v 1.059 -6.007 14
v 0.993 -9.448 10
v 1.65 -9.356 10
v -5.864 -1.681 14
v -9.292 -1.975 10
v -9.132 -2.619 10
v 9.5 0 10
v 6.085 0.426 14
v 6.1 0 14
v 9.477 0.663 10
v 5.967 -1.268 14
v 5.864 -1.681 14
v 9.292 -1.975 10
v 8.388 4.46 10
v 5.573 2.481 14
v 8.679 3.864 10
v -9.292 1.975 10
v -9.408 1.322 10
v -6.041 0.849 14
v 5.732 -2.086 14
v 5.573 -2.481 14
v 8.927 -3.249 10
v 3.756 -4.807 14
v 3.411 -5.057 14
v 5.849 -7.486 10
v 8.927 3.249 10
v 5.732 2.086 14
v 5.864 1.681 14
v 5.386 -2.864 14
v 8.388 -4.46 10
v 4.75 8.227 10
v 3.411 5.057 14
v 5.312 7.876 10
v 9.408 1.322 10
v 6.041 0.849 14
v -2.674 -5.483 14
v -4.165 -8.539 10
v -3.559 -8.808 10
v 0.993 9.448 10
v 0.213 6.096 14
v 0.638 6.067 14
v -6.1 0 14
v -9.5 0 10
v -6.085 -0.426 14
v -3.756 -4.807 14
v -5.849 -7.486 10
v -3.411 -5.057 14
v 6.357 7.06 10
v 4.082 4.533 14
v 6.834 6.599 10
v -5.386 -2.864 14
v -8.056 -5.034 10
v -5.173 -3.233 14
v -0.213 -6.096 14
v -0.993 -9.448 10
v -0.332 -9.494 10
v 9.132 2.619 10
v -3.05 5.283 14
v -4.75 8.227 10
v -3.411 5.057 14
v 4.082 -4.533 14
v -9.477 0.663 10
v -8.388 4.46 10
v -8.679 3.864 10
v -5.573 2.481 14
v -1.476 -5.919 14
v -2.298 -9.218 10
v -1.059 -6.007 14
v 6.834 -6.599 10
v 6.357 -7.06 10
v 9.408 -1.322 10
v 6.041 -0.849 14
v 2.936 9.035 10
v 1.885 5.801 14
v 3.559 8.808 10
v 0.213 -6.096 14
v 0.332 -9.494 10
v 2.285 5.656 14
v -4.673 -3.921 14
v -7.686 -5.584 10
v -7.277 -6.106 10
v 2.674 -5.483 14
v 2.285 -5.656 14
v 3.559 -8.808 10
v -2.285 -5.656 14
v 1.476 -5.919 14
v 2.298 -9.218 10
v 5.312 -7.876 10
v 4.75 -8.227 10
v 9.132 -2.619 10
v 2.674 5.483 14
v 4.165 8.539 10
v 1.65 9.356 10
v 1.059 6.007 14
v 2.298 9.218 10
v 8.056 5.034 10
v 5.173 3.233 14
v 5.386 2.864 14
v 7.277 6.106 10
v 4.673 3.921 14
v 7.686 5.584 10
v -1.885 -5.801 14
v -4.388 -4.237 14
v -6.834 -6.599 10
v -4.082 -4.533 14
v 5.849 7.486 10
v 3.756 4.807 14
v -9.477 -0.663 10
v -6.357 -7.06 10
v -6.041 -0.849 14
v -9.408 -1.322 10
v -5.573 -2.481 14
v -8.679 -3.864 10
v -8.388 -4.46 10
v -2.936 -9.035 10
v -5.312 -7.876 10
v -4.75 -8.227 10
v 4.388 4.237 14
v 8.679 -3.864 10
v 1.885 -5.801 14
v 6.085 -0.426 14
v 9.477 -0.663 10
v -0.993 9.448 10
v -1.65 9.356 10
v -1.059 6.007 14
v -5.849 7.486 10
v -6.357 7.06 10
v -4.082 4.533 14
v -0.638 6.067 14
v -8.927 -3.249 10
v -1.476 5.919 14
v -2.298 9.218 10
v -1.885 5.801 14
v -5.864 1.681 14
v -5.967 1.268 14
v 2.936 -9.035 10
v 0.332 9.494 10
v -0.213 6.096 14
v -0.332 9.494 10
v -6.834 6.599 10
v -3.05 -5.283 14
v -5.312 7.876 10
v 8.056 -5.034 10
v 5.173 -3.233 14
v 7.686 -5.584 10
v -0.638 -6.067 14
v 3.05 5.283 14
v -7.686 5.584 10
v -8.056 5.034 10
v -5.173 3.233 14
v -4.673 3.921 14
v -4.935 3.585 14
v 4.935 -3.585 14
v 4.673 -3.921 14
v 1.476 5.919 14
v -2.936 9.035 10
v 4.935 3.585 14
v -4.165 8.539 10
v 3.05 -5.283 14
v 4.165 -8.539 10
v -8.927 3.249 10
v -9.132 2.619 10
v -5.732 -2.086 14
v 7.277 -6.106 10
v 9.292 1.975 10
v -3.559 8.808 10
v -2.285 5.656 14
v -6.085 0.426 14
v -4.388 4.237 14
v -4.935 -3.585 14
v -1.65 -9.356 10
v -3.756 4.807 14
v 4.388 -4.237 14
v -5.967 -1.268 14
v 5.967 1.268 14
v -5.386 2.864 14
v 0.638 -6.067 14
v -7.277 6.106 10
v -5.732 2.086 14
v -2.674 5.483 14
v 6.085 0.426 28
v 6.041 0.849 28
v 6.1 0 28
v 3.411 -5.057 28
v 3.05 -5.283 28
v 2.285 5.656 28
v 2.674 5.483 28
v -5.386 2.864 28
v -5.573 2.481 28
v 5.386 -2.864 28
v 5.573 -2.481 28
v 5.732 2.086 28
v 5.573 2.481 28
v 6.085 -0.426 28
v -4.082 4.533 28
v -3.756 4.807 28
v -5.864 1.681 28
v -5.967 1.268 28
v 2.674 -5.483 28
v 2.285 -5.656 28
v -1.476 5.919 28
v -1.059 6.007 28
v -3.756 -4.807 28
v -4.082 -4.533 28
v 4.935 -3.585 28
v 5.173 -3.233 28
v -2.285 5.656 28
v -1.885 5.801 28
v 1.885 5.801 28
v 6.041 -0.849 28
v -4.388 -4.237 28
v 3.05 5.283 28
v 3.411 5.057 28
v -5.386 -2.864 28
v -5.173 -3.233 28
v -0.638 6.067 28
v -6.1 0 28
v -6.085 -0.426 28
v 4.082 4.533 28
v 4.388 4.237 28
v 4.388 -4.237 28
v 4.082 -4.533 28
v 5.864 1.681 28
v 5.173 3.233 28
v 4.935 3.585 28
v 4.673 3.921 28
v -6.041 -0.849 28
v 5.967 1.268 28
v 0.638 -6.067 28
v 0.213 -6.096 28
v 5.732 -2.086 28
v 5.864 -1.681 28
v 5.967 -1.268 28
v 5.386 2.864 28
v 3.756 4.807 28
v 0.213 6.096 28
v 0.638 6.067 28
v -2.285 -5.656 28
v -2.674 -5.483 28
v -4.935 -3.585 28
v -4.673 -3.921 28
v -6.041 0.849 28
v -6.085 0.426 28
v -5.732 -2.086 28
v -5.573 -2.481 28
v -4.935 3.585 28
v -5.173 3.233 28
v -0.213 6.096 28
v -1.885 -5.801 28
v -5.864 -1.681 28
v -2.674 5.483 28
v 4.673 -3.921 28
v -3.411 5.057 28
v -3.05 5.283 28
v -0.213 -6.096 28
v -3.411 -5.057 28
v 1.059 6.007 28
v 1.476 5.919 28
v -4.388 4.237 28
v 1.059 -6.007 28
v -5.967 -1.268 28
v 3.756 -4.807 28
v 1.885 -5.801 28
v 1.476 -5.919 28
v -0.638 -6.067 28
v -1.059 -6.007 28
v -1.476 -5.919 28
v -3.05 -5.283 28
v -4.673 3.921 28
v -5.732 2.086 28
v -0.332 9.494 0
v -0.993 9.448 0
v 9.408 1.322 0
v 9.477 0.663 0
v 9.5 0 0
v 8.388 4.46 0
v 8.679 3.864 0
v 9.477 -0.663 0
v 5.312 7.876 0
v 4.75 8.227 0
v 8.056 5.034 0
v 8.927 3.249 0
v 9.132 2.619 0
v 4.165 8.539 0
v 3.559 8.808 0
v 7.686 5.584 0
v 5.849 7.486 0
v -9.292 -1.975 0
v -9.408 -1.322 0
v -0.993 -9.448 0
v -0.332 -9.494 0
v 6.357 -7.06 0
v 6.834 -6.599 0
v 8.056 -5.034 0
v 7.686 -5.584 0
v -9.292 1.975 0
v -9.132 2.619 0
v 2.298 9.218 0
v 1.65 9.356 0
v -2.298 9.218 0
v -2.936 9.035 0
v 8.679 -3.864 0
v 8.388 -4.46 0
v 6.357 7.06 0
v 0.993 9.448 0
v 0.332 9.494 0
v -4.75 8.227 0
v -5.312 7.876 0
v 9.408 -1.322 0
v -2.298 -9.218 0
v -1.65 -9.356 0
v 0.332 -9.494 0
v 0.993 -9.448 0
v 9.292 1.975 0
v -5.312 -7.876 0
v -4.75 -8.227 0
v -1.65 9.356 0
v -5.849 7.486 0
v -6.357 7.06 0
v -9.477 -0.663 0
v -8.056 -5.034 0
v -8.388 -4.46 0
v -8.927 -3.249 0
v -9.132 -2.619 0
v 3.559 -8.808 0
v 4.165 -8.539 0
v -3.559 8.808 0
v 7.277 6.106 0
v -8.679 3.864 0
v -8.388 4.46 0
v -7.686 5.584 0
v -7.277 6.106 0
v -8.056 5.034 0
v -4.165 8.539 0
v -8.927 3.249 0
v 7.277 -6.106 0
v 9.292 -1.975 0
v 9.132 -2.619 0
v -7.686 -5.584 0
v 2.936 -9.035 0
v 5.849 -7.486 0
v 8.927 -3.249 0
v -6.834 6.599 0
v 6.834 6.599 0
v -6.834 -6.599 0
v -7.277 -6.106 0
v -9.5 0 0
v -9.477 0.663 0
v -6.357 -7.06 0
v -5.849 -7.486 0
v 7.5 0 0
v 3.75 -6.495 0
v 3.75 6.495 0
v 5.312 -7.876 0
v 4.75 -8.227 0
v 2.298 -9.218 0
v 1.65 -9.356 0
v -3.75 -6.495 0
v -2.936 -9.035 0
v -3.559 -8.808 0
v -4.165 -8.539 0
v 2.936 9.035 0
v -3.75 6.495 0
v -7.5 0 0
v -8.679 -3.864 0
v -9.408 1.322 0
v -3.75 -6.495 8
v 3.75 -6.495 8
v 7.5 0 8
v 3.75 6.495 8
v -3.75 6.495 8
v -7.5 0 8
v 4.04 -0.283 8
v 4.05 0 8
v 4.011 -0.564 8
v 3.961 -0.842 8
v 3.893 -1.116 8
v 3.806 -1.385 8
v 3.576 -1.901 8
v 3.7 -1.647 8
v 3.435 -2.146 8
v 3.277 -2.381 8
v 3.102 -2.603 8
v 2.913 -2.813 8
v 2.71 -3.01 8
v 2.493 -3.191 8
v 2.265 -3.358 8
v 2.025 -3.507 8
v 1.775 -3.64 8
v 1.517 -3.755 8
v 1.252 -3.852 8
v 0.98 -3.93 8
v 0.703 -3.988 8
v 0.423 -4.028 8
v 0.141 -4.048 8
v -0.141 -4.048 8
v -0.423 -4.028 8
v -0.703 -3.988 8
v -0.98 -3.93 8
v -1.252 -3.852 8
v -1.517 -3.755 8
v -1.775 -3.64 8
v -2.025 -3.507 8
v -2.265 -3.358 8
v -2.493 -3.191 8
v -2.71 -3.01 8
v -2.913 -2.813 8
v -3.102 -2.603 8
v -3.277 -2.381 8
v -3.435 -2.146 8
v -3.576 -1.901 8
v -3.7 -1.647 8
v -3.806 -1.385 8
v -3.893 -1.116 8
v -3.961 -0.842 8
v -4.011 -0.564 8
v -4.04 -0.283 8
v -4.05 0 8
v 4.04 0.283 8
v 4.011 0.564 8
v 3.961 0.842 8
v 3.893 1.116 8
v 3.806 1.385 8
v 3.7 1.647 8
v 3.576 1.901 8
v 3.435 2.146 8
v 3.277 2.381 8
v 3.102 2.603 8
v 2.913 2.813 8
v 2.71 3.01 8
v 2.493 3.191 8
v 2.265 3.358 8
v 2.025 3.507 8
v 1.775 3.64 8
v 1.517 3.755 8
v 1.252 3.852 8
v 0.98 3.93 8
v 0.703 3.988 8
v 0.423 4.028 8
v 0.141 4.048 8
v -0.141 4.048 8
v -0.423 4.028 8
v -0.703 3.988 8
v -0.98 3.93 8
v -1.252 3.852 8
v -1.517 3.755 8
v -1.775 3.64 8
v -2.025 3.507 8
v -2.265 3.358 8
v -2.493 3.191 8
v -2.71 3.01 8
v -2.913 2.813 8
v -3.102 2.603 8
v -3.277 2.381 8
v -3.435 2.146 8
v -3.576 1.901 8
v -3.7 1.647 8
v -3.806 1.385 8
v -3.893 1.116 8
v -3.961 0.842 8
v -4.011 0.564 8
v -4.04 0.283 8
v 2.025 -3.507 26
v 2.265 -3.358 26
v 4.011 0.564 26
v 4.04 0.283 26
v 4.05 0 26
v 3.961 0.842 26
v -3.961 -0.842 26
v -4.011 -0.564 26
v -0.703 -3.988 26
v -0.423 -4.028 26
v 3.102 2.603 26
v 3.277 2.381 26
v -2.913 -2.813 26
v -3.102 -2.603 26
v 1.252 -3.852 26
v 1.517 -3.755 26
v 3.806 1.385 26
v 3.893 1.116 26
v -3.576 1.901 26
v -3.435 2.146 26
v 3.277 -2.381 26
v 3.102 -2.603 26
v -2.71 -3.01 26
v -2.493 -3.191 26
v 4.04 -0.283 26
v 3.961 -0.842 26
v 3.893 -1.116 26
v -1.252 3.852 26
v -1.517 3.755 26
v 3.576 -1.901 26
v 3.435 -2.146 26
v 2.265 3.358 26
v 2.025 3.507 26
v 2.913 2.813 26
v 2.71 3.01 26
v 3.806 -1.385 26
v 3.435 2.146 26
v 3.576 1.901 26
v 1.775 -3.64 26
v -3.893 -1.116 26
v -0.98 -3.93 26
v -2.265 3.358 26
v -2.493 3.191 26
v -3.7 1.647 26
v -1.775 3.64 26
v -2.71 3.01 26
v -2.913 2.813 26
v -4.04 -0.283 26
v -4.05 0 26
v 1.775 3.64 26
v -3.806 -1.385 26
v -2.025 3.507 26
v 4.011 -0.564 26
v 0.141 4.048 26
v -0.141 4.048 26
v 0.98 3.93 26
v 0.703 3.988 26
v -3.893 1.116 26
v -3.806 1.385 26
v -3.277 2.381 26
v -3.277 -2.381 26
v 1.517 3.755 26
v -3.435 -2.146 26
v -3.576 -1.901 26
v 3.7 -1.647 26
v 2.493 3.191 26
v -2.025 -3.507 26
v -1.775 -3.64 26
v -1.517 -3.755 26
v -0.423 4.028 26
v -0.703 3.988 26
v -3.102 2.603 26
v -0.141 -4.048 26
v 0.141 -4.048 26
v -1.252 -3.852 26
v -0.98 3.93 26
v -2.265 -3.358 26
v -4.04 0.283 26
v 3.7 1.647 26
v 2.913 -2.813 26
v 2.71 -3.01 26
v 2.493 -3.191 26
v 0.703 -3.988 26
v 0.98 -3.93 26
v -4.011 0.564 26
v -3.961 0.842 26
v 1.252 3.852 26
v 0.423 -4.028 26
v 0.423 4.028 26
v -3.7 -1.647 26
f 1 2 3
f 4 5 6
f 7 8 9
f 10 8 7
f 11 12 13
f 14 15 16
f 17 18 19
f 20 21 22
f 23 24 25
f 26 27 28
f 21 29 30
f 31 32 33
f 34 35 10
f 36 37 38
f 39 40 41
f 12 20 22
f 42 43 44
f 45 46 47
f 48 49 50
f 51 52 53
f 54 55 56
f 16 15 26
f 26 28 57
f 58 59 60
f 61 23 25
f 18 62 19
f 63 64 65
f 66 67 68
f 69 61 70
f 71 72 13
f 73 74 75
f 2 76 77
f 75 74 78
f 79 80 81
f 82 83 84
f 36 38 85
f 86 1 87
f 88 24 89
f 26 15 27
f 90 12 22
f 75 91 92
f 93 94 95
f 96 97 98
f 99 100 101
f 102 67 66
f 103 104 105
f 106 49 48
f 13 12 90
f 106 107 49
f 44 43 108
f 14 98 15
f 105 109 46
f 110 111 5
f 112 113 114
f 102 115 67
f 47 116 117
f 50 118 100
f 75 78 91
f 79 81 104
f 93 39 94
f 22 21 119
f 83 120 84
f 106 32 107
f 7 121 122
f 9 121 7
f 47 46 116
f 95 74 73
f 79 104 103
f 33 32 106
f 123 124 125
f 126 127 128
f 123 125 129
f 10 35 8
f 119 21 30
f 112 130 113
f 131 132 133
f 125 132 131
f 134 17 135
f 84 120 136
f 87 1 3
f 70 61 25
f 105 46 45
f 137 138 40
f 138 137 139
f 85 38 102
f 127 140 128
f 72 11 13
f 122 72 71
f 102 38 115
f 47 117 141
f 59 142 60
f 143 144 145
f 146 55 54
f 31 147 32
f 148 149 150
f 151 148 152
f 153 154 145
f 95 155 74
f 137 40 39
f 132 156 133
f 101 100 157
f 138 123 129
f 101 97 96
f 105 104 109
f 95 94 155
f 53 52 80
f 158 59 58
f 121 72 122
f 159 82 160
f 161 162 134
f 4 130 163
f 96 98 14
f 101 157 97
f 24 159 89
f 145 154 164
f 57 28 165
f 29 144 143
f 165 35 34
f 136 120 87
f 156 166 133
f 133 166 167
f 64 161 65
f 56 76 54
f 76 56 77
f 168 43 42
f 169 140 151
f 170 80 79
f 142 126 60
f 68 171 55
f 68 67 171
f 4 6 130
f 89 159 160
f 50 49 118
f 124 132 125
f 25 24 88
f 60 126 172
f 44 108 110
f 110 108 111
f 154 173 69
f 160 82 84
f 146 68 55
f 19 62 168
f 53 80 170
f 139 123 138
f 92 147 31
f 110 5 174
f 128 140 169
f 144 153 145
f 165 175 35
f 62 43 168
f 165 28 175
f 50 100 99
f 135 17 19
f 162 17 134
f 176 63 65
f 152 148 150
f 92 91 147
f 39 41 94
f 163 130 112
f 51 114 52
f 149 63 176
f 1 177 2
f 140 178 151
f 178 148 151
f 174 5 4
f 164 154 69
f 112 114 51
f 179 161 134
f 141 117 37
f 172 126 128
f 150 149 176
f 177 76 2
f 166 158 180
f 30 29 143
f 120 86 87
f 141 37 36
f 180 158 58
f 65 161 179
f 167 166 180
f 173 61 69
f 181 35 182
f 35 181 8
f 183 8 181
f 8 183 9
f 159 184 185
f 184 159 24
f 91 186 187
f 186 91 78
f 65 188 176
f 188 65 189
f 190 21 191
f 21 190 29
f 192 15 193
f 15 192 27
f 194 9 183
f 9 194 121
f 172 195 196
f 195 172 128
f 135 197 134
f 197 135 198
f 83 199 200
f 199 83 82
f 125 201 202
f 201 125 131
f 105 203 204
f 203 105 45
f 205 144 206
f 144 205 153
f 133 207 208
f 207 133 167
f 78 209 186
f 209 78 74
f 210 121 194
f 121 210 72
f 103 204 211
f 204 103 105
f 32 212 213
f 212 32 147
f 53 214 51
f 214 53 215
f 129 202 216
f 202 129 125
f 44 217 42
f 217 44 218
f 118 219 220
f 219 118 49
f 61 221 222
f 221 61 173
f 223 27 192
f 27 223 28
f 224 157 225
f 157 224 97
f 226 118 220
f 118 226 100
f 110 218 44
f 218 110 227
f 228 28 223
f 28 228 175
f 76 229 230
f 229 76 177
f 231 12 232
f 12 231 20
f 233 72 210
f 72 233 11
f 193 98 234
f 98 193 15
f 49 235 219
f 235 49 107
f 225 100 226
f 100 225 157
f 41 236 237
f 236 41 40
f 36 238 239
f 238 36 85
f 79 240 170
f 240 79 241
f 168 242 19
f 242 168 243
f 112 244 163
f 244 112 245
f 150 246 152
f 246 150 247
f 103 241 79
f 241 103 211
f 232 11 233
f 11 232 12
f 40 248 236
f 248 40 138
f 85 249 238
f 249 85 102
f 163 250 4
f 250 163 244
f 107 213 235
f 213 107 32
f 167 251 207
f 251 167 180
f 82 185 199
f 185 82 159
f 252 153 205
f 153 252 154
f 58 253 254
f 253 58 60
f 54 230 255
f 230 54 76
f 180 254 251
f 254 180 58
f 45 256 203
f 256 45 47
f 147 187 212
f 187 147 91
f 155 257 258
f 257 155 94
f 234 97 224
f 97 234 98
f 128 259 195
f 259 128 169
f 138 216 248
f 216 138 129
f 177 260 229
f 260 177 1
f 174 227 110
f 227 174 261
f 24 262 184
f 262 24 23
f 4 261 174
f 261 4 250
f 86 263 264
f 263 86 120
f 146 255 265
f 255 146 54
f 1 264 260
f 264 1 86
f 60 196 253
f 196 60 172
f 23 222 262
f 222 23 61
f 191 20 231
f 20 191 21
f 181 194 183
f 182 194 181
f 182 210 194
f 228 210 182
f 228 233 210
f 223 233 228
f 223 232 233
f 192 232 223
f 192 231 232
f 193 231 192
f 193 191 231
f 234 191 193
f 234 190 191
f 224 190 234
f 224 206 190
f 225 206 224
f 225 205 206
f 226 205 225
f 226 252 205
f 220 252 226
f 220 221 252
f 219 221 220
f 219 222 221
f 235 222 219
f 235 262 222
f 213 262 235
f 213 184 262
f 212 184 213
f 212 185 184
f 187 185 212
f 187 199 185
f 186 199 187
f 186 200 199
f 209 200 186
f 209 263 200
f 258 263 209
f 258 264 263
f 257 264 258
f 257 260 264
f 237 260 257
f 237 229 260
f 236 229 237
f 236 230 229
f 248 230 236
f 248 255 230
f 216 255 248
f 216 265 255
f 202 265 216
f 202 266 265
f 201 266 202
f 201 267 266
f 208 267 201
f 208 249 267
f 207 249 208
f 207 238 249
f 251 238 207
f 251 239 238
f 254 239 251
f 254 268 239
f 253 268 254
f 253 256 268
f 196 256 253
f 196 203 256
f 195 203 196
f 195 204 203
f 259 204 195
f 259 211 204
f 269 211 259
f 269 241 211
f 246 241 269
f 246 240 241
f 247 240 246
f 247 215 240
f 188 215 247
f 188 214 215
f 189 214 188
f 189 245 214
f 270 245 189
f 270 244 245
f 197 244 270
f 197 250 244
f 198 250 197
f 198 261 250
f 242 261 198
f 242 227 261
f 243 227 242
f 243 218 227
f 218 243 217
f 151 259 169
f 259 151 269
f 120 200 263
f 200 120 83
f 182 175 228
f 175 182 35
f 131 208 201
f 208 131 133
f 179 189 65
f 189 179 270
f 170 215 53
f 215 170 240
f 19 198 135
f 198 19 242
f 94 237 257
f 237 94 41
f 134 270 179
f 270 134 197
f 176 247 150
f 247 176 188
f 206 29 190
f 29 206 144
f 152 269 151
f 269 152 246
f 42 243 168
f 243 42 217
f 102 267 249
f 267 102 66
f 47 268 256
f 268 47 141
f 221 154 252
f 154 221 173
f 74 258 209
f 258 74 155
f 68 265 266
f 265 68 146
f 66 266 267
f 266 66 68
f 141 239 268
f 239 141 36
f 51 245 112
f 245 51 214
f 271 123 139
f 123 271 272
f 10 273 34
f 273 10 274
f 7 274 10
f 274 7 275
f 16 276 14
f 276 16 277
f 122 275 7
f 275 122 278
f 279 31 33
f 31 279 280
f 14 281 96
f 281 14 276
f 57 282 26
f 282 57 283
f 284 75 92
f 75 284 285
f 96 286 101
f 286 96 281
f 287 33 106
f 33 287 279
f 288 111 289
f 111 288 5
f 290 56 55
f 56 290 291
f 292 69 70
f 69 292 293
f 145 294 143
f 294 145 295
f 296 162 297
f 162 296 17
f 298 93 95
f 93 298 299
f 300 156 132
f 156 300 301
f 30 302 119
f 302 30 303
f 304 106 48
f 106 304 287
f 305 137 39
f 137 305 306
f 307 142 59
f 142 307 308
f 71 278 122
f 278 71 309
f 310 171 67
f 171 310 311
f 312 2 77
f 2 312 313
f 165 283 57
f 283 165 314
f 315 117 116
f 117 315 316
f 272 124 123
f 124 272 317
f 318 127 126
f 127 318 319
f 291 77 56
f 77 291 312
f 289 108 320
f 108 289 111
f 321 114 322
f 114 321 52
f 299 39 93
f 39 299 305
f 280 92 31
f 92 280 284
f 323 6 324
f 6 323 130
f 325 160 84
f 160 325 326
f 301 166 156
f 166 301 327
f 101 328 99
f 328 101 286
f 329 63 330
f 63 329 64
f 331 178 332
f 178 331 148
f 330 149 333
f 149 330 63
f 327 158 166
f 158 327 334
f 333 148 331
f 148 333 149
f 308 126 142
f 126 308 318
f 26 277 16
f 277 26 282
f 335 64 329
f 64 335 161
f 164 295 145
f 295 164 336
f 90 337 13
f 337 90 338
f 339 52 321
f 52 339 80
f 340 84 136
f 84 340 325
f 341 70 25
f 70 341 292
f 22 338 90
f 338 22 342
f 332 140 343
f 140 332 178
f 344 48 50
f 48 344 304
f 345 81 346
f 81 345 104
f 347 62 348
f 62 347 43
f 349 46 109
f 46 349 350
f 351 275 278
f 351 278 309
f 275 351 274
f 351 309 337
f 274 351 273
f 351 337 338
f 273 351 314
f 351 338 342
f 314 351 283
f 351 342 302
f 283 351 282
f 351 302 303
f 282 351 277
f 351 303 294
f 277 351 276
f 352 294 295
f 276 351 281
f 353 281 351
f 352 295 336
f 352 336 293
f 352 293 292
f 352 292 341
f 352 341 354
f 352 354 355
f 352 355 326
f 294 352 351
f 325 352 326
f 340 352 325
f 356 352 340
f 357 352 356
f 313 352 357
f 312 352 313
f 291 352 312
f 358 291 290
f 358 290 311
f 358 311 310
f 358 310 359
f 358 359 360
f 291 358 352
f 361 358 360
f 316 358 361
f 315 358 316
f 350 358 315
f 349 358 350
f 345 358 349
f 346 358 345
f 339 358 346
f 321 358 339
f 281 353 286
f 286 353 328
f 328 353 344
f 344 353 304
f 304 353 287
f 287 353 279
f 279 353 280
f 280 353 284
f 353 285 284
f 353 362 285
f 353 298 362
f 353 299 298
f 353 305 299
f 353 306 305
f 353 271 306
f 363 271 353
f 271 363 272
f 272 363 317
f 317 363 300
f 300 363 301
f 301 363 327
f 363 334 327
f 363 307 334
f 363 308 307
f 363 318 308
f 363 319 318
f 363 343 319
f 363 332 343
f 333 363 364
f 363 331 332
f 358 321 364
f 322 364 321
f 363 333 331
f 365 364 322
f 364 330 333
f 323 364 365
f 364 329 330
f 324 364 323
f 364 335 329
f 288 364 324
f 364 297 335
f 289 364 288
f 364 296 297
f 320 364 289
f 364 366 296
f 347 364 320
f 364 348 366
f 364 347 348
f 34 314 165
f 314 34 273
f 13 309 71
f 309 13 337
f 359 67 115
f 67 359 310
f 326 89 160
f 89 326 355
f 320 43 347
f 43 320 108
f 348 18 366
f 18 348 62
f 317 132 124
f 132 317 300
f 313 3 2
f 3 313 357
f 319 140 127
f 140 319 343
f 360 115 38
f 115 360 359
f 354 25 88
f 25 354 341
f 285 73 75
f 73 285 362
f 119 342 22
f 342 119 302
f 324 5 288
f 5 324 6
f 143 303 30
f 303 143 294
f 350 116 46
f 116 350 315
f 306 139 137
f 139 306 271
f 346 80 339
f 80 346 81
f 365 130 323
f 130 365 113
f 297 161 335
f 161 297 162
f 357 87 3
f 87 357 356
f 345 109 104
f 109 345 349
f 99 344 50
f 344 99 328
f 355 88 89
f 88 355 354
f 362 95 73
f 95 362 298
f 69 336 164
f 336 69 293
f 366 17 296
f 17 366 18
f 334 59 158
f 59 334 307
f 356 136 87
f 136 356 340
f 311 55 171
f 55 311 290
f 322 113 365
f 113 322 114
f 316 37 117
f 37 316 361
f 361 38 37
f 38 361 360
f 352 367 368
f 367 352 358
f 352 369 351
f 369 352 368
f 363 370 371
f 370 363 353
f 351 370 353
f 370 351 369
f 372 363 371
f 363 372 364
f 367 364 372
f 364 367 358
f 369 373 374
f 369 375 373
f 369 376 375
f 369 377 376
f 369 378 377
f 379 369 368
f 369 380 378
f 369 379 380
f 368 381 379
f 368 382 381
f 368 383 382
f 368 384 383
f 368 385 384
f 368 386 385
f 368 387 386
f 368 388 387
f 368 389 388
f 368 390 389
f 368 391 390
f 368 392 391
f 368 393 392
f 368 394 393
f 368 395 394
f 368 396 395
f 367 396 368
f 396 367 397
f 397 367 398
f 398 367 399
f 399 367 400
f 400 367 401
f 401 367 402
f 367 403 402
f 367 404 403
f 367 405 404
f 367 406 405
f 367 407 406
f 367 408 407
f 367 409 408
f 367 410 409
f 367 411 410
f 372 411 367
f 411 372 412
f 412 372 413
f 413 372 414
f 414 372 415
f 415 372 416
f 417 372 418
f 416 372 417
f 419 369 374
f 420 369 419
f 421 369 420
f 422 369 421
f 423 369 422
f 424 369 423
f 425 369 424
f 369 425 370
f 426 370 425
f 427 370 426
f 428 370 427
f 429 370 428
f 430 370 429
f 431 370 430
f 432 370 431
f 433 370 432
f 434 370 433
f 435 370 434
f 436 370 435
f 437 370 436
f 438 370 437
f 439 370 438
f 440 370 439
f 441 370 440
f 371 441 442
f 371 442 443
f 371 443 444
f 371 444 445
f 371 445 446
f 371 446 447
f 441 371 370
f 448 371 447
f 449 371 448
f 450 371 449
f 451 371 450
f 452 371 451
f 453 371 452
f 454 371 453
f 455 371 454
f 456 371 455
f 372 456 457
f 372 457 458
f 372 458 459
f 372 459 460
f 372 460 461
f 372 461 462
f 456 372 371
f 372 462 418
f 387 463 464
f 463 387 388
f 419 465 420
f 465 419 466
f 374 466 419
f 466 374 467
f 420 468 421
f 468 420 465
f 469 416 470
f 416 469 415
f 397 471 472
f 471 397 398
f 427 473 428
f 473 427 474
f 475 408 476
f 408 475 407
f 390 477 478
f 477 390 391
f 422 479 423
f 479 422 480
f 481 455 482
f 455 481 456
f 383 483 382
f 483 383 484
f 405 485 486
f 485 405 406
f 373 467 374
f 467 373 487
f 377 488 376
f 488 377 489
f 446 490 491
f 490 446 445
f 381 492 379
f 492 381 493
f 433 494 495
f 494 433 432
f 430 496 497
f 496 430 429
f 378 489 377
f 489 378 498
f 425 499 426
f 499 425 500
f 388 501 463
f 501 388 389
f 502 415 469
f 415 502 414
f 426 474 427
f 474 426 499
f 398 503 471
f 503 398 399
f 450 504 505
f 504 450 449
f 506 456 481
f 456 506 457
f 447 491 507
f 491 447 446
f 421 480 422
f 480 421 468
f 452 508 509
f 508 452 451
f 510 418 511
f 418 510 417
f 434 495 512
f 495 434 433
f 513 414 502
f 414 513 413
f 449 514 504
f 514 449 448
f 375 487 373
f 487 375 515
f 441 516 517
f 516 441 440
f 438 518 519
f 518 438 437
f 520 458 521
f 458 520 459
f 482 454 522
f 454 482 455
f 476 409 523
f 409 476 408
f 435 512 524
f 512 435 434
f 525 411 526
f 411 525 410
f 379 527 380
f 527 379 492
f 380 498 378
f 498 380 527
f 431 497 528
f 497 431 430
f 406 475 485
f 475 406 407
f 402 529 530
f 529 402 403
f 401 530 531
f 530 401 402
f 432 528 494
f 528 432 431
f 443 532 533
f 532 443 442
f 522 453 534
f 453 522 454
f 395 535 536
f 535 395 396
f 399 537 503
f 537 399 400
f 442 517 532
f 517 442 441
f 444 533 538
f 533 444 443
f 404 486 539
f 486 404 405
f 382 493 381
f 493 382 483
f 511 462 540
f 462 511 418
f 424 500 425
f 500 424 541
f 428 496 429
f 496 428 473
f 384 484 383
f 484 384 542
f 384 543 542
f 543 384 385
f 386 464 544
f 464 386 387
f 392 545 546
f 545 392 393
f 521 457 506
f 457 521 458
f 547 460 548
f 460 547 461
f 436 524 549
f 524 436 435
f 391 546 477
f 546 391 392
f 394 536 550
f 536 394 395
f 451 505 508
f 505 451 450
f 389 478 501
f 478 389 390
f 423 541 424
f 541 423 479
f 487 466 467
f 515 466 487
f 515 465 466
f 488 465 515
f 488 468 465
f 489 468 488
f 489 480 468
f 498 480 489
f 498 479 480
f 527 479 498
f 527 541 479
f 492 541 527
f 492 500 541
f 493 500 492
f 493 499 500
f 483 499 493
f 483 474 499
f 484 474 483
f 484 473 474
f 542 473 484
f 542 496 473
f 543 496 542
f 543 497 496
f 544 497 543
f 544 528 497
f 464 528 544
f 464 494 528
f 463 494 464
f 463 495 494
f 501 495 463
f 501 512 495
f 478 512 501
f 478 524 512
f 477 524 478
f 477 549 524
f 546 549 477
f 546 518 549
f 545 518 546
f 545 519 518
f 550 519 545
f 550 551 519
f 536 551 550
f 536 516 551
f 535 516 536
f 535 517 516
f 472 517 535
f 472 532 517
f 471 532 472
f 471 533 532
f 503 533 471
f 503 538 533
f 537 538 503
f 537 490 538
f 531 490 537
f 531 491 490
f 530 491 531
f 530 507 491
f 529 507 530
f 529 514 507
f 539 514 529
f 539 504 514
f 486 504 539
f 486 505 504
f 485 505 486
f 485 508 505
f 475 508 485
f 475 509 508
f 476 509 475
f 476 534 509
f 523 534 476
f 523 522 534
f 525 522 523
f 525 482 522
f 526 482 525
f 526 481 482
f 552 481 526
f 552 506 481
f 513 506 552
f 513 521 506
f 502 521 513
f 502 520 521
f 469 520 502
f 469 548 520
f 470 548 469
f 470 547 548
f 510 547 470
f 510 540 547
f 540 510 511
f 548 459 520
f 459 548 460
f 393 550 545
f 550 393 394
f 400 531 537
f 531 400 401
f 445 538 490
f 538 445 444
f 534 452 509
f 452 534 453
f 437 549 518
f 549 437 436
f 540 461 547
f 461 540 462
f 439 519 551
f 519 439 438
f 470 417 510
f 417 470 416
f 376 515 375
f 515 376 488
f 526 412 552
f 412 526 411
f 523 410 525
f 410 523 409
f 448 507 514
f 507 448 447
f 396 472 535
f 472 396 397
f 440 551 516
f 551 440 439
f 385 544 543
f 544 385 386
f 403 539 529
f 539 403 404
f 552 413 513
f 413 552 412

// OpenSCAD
$fn = 90;
d = 19;
h1 = 8;
h2 = 20;
wall = 2;

difference() {
    difference() {
        union() {
            cylinder(d=d, h=h1+2);
            translate([0,0,h1+2]) {
                cylinder(d1=d, d2=8.2+wall*2, wall*2);
                cylinder(d=8.2+wall*2, h2-wall);
            }
        }
        cylinder(d=15, h=h1, $fn=6); // nut hole
        cylinder(d=8.1, h=h1+h2-wall); // bolt hole
    }
    // cube([10, 10, 40]);
}
